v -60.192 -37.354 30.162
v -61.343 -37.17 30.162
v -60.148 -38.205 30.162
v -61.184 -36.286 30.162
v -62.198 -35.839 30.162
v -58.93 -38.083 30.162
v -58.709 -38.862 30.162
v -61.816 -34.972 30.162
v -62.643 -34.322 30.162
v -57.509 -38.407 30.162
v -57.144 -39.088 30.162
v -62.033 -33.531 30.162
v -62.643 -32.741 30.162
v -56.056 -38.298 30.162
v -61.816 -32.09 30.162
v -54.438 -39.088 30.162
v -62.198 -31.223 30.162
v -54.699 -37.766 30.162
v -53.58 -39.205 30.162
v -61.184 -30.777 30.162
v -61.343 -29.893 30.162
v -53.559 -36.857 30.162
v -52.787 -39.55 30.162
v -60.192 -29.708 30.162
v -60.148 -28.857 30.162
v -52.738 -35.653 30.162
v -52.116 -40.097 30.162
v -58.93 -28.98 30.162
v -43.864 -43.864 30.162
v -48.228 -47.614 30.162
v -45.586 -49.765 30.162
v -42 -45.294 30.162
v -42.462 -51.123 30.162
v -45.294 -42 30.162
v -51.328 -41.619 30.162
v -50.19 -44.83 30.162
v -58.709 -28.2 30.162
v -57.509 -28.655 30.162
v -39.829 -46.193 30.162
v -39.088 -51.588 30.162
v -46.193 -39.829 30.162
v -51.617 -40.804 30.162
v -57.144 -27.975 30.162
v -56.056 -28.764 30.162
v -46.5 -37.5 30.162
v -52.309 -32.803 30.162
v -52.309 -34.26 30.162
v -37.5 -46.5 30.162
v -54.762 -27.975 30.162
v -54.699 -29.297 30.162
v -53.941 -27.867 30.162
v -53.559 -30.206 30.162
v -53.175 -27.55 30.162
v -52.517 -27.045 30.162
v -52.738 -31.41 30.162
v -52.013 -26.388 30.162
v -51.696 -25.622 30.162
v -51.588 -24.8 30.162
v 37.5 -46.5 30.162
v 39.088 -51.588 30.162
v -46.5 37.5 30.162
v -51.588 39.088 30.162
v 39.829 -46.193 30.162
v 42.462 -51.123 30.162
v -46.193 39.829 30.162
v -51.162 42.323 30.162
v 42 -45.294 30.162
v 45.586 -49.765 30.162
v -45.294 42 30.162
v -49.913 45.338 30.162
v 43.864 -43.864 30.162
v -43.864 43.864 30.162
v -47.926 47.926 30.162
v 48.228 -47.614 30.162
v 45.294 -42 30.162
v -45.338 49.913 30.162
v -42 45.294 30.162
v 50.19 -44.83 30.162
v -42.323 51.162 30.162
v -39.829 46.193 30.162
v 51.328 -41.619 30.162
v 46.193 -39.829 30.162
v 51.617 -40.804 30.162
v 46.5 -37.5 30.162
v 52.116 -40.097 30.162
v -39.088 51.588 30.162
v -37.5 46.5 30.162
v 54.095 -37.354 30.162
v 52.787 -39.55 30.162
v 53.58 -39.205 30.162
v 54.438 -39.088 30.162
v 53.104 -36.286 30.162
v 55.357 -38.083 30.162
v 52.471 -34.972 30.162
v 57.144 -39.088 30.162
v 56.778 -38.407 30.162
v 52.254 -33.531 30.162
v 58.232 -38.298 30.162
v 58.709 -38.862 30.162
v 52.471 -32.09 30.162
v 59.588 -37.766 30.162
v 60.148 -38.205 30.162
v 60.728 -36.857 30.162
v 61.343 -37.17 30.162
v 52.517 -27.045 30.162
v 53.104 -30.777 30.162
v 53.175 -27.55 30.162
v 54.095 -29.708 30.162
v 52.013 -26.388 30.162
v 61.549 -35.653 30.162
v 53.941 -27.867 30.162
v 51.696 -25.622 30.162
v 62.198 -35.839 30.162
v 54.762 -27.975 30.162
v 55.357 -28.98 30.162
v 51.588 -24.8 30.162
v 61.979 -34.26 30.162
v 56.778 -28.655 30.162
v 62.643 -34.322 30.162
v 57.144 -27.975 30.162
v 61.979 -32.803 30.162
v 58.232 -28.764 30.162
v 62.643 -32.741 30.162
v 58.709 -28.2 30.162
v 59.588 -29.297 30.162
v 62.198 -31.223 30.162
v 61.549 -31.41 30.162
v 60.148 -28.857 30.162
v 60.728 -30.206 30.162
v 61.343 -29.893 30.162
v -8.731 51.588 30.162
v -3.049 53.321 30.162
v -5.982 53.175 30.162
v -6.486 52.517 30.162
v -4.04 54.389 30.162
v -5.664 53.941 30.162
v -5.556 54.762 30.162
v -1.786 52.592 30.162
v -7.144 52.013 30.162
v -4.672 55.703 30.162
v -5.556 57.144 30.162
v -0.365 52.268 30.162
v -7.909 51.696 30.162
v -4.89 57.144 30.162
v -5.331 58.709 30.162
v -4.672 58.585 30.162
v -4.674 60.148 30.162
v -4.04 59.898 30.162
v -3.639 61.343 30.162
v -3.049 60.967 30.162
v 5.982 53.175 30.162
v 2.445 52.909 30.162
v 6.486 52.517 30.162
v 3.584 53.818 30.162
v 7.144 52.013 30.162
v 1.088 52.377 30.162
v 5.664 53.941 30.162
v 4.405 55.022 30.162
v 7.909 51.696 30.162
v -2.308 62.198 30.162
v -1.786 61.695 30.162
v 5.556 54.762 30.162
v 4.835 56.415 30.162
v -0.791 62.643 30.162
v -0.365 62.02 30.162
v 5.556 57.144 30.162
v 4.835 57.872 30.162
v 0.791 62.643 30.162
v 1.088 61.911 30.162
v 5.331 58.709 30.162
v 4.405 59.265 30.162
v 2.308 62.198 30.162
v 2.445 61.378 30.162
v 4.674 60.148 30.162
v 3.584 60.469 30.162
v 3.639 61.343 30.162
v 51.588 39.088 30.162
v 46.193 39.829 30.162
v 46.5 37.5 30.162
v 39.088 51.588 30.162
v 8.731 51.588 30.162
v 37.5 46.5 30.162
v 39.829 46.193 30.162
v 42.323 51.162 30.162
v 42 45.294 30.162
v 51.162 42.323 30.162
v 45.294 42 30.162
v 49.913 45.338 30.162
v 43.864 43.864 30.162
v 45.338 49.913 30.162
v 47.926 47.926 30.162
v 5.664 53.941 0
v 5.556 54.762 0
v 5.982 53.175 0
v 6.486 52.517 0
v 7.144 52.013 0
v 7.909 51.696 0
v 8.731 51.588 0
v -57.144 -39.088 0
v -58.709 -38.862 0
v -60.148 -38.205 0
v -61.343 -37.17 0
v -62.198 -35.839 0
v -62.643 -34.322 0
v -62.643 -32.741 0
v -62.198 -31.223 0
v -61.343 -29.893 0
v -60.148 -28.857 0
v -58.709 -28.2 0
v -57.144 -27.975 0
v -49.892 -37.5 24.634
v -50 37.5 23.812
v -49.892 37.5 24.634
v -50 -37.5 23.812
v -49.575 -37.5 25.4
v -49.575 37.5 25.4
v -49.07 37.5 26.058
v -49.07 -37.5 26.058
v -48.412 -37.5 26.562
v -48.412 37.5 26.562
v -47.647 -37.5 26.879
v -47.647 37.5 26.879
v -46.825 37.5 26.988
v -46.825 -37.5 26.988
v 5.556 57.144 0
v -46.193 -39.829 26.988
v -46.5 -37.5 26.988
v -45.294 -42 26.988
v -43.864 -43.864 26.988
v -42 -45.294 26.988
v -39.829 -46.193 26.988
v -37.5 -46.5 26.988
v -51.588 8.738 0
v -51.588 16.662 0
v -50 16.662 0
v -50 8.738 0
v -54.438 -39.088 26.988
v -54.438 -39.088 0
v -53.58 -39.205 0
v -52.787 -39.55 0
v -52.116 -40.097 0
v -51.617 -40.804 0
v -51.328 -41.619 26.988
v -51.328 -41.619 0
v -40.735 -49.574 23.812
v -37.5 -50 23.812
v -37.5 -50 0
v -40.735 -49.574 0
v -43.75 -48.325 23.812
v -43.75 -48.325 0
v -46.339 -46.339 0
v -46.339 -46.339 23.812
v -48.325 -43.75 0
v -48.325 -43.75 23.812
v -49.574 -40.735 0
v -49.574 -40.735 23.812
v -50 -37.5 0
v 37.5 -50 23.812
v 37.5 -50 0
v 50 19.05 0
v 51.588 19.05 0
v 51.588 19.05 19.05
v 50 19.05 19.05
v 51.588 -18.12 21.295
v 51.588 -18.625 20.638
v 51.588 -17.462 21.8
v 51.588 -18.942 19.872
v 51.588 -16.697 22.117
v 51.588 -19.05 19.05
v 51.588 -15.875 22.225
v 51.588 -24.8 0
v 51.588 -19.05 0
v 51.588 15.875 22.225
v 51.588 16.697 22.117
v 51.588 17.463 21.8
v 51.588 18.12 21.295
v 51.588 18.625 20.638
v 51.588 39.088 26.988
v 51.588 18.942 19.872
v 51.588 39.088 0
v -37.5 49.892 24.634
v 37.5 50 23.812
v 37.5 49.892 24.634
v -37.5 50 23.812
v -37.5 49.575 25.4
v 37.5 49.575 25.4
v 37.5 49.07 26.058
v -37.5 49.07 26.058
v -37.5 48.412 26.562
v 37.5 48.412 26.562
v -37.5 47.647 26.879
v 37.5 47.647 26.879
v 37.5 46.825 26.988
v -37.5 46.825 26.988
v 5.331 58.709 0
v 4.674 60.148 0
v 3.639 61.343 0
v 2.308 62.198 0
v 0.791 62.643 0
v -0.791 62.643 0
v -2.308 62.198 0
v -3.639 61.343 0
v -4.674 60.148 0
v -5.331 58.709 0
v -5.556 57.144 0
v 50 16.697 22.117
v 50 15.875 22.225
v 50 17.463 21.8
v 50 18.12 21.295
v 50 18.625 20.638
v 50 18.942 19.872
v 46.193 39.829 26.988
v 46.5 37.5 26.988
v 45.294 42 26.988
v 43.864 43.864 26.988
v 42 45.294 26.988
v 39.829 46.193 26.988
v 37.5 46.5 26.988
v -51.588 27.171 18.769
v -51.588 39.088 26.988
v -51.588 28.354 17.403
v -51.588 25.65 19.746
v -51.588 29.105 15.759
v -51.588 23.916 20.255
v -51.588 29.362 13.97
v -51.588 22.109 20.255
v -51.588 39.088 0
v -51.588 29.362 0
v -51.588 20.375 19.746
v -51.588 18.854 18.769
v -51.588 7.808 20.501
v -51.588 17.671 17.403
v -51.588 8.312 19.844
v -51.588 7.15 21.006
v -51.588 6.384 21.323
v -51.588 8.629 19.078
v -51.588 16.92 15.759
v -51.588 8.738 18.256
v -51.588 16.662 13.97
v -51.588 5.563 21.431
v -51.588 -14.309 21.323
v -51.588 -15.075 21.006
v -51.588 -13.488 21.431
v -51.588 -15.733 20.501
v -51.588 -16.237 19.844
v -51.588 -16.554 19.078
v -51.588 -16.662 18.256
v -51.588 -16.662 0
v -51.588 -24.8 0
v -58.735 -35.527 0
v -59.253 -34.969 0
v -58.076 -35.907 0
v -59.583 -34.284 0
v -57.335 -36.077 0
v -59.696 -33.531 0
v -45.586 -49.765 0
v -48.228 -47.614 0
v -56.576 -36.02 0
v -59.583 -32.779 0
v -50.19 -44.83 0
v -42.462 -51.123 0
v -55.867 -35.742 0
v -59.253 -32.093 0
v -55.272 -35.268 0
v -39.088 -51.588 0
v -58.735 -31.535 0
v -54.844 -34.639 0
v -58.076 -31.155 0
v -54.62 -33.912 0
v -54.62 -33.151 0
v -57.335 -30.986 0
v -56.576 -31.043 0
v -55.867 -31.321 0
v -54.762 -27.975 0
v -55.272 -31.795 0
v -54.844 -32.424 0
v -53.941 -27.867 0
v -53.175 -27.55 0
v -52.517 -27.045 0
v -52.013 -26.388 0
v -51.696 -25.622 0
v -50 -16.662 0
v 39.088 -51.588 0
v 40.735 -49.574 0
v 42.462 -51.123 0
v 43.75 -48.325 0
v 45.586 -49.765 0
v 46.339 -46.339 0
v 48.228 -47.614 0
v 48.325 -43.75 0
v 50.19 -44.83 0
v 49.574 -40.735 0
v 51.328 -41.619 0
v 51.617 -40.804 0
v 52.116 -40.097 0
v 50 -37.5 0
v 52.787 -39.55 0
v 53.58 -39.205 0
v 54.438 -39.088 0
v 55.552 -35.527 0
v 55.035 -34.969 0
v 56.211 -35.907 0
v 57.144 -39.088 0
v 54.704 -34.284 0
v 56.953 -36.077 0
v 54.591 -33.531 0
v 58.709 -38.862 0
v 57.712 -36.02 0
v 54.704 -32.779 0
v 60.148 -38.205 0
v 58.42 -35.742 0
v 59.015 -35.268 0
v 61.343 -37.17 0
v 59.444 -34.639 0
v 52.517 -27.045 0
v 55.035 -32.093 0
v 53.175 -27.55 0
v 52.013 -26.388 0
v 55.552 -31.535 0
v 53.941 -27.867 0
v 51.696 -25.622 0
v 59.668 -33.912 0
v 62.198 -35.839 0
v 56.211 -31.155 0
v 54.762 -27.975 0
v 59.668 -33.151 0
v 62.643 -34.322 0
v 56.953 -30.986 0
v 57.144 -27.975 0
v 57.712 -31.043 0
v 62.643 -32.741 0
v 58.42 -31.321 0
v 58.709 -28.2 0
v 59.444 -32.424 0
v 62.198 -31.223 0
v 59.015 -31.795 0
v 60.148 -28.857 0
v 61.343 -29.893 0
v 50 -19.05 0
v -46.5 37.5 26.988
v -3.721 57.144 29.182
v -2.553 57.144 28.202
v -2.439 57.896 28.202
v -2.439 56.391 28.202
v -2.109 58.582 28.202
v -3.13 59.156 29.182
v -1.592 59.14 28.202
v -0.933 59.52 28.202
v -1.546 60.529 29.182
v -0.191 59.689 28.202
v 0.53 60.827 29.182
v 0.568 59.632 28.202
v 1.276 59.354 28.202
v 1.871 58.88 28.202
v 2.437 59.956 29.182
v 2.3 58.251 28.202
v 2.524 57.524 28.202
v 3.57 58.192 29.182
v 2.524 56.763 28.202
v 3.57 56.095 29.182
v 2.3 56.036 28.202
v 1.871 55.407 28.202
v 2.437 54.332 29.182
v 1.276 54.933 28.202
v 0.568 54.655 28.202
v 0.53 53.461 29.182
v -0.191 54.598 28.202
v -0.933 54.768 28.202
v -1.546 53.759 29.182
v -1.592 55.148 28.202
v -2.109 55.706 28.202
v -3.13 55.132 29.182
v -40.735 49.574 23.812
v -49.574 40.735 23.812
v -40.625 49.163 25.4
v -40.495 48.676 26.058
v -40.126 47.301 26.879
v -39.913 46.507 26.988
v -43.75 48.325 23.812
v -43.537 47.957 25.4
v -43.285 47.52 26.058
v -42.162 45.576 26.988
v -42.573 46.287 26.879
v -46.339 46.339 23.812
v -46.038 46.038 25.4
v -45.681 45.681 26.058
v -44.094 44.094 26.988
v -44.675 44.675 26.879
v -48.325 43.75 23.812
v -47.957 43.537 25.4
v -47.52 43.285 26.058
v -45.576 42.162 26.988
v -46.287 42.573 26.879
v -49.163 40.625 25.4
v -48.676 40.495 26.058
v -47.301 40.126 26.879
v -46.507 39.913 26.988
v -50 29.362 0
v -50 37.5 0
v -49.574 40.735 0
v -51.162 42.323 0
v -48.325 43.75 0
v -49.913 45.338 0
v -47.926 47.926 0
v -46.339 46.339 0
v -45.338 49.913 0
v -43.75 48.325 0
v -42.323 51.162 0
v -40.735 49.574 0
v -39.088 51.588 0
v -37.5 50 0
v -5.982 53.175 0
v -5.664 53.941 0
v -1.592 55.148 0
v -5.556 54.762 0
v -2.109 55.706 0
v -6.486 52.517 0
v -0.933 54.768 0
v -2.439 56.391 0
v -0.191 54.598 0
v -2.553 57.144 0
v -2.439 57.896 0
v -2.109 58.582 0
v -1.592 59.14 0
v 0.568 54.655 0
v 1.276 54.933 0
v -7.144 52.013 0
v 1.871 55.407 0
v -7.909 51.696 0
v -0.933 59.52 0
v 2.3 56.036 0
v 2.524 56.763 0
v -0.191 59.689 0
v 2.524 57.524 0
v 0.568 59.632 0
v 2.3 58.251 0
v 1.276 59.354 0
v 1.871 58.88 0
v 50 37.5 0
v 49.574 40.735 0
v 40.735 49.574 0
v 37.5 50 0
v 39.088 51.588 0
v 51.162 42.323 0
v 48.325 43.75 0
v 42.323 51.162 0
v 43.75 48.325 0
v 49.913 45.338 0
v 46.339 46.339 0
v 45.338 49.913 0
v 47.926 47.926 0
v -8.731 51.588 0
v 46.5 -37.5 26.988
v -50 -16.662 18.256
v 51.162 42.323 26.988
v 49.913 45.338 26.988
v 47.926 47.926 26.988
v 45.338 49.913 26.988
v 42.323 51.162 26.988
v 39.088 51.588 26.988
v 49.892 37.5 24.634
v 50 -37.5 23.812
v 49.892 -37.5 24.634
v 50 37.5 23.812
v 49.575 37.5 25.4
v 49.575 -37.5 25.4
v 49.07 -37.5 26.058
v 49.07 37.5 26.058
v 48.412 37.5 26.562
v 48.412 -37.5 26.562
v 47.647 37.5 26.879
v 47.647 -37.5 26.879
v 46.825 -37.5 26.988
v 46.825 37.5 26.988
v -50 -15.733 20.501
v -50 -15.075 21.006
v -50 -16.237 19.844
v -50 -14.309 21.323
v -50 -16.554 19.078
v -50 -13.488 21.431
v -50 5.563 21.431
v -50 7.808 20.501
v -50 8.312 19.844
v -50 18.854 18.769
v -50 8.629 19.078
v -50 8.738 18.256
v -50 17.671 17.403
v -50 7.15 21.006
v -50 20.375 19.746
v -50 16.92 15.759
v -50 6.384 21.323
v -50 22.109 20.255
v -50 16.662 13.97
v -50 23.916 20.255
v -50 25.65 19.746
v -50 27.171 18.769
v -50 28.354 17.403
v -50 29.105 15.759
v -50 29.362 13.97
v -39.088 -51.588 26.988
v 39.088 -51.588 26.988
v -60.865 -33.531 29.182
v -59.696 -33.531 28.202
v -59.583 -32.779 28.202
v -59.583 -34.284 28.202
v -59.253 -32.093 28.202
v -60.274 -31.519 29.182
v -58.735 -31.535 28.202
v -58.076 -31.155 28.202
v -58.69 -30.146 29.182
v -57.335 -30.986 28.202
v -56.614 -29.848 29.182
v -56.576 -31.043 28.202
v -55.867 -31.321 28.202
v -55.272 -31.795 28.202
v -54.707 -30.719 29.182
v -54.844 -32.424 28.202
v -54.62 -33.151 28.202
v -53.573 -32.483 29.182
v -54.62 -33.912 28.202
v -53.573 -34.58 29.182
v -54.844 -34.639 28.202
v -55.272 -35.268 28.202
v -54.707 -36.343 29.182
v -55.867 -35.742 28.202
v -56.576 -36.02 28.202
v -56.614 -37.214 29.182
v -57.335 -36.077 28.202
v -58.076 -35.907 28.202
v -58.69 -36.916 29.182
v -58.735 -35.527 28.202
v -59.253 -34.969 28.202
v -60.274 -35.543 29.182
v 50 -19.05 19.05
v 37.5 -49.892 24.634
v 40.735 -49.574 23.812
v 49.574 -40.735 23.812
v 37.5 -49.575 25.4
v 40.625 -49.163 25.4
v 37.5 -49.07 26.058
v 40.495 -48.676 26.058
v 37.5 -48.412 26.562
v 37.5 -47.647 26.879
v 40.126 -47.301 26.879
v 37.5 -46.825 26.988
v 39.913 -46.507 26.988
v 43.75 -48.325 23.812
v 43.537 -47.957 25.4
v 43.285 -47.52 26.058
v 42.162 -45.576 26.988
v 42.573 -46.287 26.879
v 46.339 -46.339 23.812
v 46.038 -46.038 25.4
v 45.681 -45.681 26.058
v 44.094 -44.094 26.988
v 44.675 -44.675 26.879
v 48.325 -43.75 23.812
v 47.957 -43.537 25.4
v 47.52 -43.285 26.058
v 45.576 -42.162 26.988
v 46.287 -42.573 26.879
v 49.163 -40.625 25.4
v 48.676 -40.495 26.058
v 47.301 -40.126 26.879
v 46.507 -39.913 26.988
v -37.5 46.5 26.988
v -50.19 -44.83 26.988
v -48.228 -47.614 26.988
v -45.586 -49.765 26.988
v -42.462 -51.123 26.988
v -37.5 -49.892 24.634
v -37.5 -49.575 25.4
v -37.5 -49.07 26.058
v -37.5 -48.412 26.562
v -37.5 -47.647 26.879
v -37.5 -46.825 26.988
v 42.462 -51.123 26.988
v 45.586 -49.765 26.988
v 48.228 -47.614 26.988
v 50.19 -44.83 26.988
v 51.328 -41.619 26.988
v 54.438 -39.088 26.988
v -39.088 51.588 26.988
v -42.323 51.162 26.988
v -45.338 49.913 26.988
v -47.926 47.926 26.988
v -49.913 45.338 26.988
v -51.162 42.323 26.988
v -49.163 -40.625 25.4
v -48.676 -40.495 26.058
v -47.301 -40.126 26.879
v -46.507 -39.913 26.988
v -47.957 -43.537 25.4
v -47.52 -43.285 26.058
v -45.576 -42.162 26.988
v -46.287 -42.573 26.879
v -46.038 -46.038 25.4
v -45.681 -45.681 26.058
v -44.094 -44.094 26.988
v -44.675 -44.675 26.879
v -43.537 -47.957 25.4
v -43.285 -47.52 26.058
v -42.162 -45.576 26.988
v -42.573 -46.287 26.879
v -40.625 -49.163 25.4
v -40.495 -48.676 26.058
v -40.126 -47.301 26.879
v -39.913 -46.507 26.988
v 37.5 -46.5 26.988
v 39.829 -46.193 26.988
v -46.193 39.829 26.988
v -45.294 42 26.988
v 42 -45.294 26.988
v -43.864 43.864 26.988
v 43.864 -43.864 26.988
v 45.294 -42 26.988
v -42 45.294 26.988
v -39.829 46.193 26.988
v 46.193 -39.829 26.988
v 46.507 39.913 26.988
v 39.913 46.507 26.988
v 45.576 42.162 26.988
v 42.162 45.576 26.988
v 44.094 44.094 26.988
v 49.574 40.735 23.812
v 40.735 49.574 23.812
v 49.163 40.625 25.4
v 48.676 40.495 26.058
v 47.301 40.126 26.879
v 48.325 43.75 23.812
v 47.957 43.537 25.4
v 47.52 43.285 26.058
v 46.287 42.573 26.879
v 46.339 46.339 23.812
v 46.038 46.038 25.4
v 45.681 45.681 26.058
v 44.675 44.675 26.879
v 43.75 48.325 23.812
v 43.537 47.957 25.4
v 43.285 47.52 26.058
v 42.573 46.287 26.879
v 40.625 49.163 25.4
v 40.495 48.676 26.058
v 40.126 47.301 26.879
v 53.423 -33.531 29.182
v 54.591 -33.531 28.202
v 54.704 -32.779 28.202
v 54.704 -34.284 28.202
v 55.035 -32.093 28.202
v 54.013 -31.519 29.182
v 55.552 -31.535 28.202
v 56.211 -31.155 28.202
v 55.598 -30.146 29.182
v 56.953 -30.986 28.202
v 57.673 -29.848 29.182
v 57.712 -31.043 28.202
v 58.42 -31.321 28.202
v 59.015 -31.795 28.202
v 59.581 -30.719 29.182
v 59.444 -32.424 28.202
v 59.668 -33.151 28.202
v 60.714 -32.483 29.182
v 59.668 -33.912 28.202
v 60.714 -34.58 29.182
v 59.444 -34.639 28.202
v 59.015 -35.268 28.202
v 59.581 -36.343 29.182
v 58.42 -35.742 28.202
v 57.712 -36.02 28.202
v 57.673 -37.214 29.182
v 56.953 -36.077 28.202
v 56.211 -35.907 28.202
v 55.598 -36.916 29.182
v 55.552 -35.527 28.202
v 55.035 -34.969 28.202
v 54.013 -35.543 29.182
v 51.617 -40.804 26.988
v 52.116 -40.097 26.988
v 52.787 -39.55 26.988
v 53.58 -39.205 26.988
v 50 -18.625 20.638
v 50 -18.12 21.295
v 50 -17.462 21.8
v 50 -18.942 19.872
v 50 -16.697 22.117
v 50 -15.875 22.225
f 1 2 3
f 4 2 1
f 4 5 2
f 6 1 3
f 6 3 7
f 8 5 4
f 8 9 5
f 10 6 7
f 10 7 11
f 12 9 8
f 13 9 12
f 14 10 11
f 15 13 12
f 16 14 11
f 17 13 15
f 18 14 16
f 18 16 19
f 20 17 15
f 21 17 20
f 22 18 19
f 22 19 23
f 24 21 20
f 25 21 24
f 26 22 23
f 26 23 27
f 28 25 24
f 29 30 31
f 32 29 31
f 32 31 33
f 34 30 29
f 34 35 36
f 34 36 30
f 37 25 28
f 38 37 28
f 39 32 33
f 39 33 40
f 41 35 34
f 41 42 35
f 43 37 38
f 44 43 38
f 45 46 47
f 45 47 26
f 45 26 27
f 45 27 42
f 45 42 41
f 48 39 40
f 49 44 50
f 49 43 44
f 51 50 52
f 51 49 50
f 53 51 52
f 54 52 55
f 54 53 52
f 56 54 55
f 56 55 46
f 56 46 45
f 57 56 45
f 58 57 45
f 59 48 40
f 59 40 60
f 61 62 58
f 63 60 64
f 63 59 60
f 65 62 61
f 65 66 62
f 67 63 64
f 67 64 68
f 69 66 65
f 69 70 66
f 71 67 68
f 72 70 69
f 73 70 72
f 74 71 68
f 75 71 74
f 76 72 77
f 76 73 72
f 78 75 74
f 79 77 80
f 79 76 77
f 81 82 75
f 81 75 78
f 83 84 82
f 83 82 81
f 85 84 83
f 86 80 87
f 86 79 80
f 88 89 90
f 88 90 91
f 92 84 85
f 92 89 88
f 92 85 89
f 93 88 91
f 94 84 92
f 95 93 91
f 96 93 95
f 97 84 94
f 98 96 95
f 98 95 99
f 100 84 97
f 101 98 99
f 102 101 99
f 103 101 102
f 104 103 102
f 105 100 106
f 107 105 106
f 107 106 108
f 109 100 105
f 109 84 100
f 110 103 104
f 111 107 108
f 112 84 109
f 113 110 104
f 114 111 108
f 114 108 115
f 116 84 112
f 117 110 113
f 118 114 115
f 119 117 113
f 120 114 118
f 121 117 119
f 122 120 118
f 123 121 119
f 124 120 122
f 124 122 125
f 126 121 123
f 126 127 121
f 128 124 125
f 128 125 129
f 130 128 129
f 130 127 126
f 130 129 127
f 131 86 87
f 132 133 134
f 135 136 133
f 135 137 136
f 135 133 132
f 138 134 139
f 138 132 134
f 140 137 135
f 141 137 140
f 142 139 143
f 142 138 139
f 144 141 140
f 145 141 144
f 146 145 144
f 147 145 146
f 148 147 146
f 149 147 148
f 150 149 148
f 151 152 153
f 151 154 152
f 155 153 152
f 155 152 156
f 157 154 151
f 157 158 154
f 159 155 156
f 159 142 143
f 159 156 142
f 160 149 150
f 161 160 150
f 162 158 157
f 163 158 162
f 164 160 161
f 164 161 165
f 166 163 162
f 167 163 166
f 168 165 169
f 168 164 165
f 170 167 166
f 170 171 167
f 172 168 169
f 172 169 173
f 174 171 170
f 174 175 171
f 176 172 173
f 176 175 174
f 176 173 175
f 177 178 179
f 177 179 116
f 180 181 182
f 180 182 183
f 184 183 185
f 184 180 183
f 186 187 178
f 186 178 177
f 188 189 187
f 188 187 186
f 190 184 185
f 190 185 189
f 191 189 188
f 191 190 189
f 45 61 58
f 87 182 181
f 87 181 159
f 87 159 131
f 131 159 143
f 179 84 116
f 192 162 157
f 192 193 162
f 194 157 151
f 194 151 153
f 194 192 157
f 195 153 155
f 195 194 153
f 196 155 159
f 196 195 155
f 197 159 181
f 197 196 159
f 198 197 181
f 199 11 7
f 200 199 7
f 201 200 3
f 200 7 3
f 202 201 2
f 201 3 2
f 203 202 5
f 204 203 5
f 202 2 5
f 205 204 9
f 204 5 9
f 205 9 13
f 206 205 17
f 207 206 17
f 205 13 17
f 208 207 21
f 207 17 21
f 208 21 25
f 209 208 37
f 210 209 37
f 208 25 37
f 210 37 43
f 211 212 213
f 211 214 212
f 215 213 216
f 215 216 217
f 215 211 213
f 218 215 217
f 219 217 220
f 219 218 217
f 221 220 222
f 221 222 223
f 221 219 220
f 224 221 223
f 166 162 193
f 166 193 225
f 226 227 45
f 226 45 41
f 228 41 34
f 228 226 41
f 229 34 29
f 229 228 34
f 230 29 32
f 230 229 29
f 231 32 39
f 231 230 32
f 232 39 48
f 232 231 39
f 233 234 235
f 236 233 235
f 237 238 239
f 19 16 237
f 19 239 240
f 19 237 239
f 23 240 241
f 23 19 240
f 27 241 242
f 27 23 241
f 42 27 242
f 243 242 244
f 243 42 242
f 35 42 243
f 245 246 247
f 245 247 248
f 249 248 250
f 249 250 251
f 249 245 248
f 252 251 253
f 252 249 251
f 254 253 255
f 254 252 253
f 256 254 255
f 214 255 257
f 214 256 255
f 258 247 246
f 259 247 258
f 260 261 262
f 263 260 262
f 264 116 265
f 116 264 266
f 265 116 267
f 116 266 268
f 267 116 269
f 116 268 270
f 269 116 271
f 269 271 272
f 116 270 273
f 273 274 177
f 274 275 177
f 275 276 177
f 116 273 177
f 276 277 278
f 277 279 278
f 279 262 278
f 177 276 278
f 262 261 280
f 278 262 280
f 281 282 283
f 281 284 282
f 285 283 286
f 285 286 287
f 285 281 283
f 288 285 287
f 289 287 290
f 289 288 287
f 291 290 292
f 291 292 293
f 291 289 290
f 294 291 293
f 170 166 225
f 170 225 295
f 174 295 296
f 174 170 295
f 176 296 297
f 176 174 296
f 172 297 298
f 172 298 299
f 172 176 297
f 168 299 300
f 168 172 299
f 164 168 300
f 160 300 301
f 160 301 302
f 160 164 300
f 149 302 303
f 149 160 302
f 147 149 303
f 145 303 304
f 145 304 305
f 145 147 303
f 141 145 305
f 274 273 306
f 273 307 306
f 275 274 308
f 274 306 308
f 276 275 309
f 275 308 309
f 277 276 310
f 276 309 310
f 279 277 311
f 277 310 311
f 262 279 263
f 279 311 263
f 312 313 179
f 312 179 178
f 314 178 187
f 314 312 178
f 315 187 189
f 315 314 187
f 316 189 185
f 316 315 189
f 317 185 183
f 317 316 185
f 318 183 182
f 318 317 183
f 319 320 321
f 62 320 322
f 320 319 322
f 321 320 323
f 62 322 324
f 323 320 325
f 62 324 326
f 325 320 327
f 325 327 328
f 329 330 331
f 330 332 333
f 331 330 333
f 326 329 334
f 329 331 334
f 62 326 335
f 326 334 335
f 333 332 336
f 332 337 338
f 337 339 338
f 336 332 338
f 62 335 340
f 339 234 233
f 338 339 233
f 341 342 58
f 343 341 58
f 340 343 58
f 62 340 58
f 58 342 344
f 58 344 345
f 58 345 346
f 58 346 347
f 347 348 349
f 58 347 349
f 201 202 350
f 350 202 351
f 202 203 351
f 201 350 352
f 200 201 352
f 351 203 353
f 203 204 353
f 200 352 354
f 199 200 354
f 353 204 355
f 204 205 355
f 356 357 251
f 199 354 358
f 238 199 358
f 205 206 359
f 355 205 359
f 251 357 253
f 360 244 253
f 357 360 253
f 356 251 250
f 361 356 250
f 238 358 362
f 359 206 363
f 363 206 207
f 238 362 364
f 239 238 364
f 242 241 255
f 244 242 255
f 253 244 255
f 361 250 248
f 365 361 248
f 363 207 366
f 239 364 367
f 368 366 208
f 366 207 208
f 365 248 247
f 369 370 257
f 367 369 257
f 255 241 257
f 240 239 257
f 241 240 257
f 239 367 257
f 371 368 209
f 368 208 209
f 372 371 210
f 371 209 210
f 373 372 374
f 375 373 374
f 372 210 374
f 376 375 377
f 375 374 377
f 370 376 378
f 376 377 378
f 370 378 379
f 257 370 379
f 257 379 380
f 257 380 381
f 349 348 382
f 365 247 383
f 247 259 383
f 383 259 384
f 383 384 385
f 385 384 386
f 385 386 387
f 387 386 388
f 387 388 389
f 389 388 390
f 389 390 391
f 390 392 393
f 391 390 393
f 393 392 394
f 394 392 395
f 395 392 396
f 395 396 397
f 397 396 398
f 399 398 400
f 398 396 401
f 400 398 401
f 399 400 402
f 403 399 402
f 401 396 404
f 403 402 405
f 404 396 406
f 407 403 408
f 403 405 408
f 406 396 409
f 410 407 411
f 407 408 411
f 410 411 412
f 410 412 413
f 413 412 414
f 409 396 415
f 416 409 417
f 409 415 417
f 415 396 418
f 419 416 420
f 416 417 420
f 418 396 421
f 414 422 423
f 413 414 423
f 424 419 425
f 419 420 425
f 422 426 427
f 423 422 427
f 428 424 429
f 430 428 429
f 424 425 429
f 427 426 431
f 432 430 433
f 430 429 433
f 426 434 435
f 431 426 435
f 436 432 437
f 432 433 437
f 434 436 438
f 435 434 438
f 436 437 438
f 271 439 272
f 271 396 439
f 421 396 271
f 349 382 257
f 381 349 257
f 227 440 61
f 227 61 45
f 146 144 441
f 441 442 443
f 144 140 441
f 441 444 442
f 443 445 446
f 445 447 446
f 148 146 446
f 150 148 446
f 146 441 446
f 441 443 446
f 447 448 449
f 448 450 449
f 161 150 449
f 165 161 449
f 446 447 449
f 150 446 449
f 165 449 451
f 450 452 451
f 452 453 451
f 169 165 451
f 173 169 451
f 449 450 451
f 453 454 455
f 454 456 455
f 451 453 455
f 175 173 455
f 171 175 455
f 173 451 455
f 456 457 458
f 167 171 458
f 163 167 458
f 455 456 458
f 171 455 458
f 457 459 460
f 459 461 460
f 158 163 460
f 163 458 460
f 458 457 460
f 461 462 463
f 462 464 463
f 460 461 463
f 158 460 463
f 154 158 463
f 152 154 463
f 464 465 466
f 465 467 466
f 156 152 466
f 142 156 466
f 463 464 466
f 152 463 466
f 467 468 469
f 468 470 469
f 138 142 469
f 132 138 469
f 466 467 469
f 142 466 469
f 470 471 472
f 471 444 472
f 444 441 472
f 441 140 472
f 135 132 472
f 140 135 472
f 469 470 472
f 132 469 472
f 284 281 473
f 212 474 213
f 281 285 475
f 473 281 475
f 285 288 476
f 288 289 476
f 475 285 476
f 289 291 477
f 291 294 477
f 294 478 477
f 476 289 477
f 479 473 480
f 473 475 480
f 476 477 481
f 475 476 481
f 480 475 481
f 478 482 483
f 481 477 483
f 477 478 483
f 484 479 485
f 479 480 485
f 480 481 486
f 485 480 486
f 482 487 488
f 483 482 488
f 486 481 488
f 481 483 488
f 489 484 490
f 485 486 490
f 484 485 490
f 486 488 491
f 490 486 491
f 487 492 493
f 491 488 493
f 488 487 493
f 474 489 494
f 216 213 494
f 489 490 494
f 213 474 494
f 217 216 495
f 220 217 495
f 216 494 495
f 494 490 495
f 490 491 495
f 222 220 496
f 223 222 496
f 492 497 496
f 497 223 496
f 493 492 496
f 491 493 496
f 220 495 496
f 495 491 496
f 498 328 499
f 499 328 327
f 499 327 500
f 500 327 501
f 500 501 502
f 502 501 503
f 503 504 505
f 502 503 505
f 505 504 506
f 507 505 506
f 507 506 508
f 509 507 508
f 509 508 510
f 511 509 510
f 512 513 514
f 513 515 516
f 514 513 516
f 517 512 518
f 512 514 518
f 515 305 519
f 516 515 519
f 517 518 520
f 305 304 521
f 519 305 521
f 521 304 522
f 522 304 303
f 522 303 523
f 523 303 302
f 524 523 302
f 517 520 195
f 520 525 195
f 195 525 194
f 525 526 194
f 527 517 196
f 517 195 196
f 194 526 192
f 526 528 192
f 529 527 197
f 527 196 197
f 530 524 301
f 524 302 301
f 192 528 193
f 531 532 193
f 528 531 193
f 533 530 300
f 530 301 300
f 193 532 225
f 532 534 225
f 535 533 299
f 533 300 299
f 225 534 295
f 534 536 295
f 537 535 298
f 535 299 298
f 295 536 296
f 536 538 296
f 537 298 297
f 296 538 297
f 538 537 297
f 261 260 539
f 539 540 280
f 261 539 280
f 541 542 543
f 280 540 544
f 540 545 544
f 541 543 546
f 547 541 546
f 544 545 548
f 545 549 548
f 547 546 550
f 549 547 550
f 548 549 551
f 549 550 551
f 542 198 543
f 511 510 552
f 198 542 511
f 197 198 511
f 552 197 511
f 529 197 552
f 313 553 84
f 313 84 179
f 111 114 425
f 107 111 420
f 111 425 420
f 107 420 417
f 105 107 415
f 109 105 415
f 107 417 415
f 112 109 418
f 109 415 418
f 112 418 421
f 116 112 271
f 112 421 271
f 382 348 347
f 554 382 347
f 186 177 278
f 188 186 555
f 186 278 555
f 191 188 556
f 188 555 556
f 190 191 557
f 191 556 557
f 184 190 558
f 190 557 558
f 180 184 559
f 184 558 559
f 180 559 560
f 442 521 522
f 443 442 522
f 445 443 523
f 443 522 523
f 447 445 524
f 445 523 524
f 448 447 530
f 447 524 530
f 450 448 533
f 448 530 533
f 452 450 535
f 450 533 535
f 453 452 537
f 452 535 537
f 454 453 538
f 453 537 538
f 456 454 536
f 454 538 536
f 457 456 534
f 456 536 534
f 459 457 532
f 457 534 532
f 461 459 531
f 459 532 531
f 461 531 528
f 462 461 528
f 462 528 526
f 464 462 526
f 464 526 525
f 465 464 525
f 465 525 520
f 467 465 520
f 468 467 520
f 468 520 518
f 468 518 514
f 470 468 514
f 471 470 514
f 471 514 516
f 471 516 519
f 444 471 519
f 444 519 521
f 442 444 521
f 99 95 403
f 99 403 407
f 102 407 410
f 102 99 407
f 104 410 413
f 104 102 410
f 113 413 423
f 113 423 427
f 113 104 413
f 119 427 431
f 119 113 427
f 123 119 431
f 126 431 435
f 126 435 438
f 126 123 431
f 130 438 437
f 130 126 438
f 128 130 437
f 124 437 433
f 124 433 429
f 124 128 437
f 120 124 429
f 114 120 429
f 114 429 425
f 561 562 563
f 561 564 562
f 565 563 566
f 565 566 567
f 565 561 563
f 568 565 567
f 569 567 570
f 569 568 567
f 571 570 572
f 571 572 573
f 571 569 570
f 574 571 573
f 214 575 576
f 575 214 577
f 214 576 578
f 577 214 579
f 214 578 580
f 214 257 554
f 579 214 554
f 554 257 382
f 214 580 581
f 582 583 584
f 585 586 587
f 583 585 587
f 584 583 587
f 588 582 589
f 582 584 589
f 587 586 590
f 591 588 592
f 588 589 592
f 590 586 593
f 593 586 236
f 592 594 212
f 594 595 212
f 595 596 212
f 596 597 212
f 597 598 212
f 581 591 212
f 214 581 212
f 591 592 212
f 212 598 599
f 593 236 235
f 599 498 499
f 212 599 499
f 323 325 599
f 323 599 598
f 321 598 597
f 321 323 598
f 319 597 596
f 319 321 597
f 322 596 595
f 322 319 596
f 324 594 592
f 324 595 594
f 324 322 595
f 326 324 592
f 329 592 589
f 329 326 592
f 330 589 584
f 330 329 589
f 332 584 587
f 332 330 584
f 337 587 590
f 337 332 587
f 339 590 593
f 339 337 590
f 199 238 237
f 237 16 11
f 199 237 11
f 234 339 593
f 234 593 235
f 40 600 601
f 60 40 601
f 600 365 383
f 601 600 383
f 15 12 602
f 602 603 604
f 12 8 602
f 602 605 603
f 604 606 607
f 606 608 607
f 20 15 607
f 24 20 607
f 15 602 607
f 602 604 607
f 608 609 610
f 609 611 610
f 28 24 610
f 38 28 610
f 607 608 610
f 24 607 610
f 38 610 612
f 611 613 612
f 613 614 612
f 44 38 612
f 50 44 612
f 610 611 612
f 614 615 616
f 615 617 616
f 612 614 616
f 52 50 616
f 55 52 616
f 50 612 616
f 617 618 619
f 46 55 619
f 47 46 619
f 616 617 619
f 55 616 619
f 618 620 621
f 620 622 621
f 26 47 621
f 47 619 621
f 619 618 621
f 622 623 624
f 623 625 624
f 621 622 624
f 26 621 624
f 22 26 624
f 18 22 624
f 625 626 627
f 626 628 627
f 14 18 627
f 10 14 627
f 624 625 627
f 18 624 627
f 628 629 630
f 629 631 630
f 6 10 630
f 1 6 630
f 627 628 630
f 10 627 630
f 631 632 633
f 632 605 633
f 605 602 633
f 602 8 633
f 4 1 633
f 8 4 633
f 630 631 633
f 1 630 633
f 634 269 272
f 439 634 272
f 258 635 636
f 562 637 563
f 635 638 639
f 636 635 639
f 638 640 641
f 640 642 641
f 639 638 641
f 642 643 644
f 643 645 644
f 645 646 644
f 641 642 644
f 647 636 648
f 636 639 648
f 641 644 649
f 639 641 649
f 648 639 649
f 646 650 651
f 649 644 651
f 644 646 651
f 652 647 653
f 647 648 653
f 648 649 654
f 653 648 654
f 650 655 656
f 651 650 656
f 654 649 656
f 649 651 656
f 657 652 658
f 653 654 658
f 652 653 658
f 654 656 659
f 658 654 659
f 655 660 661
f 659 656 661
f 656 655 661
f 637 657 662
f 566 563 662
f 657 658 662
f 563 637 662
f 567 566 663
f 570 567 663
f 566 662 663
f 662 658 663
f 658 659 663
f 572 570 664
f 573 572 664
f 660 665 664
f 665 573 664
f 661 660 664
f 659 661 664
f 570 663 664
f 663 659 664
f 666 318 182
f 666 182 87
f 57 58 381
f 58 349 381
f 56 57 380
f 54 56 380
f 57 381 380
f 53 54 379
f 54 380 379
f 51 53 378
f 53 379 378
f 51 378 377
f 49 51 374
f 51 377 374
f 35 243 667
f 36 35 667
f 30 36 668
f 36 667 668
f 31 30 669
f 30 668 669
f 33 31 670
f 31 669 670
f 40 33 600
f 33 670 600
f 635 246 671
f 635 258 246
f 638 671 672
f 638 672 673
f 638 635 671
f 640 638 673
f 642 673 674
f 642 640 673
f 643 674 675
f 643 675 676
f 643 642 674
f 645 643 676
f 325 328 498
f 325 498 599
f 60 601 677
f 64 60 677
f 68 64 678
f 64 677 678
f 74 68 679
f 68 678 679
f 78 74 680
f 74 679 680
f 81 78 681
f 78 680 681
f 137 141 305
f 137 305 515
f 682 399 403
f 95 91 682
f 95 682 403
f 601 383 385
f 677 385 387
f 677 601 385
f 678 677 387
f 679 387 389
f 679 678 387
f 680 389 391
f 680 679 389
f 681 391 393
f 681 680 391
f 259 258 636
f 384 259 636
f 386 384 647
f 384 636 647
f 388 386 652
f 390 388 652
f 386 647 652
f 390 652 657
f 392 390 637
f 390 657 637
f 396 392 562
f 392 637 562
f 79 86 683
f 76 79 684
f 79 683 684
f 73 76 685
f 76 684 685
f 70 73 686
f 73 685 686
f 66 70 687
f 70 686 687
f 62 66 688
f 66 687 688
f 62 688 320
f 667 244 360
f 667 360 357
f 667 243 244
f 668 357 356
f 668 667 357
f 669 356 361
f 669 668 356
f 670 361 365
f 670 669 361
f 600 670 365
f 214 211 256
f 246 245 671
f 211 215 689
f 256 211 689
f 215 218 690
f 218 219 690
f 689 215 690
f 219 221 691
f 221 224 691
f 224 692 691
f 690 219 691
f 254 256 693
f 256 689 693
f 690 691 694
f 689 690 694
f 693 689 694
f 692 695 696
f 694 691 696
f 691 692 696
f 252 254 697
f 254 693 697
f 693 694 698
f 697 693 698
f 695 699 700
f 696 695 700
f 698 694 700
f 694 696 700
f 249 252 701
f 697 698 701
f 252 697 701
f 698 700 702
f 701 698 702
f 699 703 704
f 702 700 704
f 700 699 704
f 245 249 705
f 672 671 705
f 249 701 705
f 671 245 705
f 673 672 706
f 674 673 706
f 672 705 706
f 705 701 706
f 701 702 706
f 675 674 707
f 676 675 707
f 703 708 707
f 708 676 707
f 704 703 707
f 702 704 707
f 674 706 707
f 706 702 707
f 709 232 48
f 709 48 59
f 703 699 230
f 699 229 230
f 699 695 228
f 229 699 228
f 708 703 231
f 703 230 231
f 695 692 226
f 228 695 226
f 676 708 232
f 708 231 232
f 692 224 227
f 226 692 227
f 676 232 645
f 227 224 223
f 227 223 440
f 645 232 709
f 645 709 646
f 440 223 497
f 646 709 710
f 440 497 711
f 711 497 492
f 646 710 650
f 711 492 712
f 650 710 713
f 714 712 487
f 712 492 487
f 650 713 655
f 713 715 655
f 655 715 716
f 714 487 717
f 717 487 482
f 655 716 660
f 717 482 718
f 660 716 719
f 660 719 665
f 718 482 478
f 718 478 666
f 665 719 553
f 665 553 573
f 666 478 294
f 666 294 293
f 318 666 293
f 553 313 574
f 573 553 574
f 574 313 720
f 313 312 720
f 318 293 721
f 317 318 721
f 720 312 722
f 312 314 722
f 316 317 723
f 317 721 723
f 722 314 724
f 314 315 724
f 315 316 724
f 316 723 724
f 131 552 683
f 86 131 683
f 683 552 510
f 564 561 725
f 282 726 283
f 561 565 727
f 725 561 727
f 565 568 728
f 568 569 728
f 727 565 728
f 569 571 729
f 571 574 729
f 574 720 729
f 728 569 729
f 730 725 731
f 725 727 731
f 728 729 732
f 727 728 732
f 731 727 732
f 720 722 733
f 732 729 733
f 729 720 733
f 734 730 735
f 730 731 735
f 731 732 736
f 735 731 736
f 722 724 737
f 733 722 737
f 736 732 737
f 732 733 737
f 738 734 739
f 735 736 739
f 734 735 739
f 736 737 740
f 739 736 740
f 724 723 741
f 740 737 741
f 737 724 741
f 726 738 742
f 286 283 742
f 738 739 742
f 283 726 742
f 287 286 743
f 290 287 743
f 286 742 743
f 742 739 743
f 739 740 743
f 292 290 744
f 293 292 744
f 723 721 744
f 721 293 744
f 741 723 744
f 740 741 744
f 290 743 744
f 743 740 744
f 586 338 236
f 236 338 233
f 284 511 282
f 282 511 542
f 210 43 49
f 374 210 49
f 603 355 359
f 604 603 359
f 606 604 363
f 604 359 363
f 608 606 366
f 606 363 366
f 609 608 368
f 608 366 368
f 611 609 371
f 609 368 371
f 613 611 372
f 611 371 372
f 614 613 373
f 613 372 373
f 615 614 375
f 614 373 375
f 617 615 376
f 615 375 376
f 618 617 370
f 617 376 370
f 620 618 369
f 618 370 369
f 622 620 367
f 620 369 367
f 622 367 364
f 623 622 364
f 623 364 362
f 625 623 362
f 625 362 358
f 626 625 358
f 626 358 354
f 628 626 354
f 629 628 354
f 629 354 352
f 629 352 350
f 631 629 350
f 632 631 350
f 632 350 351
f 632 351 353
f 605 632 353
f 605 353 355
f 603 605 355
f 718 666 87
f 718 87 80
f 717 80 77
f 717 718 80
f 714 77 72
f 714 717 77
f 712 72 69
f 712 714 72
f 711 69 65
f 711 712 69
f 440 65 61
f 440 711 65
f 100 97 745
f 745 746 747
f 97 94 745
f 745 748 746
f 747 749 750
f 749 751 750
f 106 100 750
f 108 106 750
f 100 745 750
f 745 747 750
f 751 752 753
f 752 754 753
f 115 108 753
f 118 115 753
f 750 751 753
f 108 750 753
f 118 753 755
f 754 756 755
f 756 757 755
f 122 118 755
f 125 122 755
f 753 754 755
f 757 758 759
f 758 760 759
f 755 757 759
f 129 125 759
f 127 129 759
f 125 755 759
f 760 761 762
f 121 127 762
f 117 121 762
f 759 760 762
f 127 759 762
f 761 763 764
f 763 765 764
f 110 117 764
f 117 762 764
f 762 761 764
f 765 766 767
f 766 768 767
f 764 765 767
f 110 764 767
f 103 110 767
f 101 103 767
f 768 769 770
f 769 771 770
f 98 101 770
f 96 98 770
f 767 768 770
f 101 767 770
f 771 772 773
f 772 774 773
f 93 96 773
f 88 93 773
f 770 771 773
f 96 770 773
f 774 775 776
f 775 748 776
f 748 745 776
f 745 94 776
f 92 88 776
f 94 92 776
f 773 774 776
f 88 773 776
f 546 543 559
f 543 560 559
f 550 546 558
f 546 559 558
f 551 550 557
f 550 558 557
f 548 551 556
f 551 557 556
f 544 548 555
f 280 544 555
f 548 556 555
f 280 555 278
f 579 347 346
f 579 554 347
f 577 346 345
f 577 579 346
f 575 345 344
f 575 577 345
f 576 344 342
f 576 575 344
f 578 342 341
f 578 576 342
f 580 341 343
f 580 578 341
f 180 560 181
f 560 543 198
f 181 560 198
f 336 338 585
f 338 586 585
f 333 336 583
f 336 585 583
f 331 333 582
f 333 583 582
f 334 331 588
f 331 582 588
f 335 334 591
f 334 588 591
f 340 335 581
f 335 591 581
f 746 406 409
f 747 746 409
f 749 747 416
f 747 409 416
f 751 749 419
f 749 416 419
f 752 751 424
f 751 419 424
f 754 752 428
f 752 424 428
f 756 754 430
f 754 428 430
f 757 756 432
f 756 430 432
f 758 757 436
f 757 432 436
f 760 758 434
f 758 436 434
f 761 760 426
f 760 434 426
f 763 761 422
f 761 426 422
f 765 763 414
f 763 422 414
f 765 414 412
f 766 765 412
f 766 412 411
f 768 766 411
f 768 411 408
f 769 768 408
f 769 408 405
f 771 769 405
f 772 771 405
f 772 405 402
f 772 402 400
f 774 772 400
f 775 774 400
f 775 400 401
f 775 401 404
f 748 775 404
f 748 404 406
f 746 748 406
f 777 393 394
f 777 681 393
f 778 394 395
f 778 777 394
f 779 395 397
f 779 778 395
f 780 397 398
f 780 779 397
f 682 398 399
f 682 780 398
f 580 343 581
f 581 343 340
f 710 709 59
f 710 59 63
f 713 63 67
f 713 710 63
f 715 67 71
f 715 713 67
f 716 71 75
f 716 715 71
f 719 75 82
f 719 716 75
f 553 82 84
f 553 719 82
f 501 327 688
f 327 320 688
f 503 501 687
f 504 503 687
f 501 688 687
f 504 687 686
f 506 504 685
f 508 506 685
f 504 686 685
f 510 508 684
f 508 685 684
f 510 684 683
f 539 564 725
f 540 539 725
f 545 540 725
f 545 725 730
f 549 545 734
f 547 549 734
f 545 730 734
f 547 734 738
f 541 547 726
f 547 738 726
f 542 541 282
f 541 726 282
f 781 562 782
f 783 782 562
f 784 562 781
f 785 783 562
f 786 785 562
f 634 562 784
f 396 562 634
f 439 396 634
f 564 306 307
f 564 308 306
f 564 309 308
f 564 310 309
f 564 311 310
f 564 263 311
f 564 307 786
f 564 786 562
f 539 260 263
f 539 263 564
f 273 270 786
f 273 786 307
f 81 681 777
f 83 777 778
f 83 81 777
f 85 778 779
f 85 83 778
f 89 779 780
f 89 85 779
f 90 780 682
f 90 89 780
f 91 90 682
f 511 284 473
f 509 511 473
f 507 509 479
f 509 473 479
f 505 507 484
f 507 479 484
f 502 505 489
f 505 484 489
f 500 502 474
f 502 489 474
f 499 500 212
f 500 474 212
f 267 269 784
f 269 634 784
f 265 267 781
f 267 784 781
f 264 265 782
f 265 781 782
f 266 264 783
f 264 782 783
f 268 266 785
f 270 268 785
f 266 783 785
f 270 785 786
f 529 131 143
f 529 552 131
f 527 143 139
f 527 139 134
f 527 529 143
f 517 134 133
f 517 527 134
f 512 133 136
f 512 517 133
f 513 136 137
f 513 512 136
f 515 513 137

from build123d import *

# Parameters (mm, degrees)
SKETCH1_W                                          = 103.175
SKETCH1_H                                          = 103.175
SKETCH1_W_2                                        = 100
SKETCH1_H_2                                        = 100
BOSS_EXTRUDE1_DEPTH                                = 26.9875
FILLET1_R                                          = 12.5
FILLET2_R                                          = 12.5
BOSS_EXTRUDE2_DEPTH                                = 3.175
CUT_EXTRUDE1_REACH                                 = 105.175
CUT_EXTRUDE2_REACH                                 = 105.175
CUT_EXTRUDE3_REACH                                 = 105.175
FILLET5_R                                          = 3.175
BOSS_EXTRUDE3_DEPTH                                = 30.1625
CSK_FOR_10_FLAT_HEAD_MACHINE_SCREW_100_D           = 5.1054
CSK_FOR_10_FLAT_HEAD_MACHINE_SCREW_100_DEPTH       = 30.1625
CSK_FOR_10_FLAT_HEAD_MACHINE_SCREW_100_CSINK_D     = 9.779
CSK_FOR_10_FLAT_HEAD_MACHINE_SCREW_100_CSINK_ANGLE = 100
FILLET4_R                                          = 3.175


with BuildPart() as part:
    # Sketch1 → Boss-Extrude1 (new body)
    with BuildSketch(Plane.XY):
        Rectangle(SKETCH1_W, SKETCH1_H)
        Rectangle(SKETCH1_W_2, SKETCH1_H_2, mode=Mode.SUBTRACT)
    extrude(amount=BOSS_EXTRUDE1_DEPTH)

    # Fillet1
    fillet1_edges = [part.edges().sort_by_distance(p)[0] for p in [
        (50, -50, 13.49375),
        (50, 50, 13.49375),
        (-50, 50, 13.49375),
        (-50, -50, 13.49375),
    ]]
    fillet(fillet1_edges, radius=FILLET1_R)

    # Fillet2
    fillet2_edges = [part.edges().sort_by_distance(p)[0] for p in [
        (51.5875, -51.5875, 13.49375),
        (-51.5875, -51.5875, 13.49375),
        (-51.5875, 51.5875, 13.49375),
        (51.5875, 51.5875, 13.49375),
    ]]
    fillet(fillet2_edges, radius=FILLET2_R)

    # Sketch2 → Boss-Extrude2 (add)
    with BuildSketch(Plane.XY.offset(26.9875)):
        with BuildLine():
            Line((-39.0875, -51.5875), (39.0875, -51.5875))
            ThreePointArc((39.0875, -51.5875), (47.926334765, -47.926334765), (51.5875, -39.0875))
            Line((51.5875, -39.0875), (51.5875, 39.0875))
            ThreePointArc((51.5875, 39.0875), (47.926334765, 47.926334765), (39.0875, 51.5875))
            Line((39.0875, 51.5875), (-39.0875, 51.5875))
            ThreePointArc((-39.0875, 51.5875), (-47.926334765, 47.926334765), (-51.5875, 39.0875))
            Line((-51.5875, 39.0875), (-51.5875, -39.0875))
            ThreePointArc((-51.5875, -39.0875), (-47.926334765, -47.926334765), (-39.0875, -51.5875))
        make_face()
        with BuildLine():
            Line((46.5, -37.5), (46.5, 37.5))
            ThreePointArc((46.5, 37.5), (43.863961031, 43.863961031), (37.5, 46.5))
            Line((37.5, 46.5), (-37.5, 46.5))
            ThreePointArc((-37.5, 46.5), (-43.863961031, 43.863961031), (-46.5, 37.5))
            Line((-46.5, 37.5), (-46.5, -37.5))
            ThreePointArc((-46.5, -37.5), (-43.863961031, -43.863961031), (-37.5, -46.5))
            Line((-37.5, -46.5), (37.5, -46.5))
            ThreePointArc((37.5, -46.5), (43.863961031, -43.863961031), (46.5, -37.5))
        make_face(mode=Mode.SUBTRACT)
    extrude(amount=BOSS_EXTRUDE2_DEPTH)

    # Sketch3 → Cut-Extrude1 (cut, up to next)
    with BuildSketch(Plane.ZY.offset(51.5875), mode=Mode.PRIVATE) as cut_extrude1_sk1:
        with BuildLine():
            Line((0, 29.3625), (13.97, 29.3625))
            ThreePointArc((13.97, 29.3625), (20.32, 23.0125), (13.97, 16.6625))
            Line((13.97, 16.6625), (0, 16.6625))
            ThreePointArc((0, 16.6625), (-6.35, 23.0125), (0, 29.3625))
        make_face()
    cut_extrude1_tool1 = extrude(cut_extrude1_sk1.sketch, amount=-CUT_EXTRUDE1_REACH, mode=Mode.PRIVATE) & part.part
    add(cut_extrude1_tool1.solids().sort_by_distance((-51.5875, 23.0125, 6.985))[0], mode=Mode.SUBTRACT)

    # Sketch5 → Cut-Extrude2 (cut, up to next)
    with BuildSketch(Plane.ZY.offset(51.5875), mode=Mode.PRIVATE) as cut_extrude2_sk1:
        Polygon((8.73125, -16.6625), (21.43125, -16.6625), (21.43125, 8.7375), (8.73125, 8.7375), (0, 8.7375), (0, -16.6625), align=None)
    cut_extrude2_tool1 = extrude(cut_extrude2_sk1.sketch, amount=-CUT_EXTRUDE2_REACH, mode=Mode.PRIVATE) & part.part
    add(cut_extrude2_tool1.solids().sort_by_distance((-51.5875, -3.9625, 10.715625))[0], mode=Mode.SUBTRACT)

    # Sketch6 → Cut-Extrude3 (cut, up to next)
    with BuildSketch(Plane(origin=(51.5875, 0, 0), x_dir=(0, 0, -1), z_dir=(1, 0, 0)), mode=Mode.PRIVATE) as cut_extrude3_sk1:
        Polygon((-3.175, -19.05), (-22.225, -19.05), (-22.225, 19.05), (-3.175, 19.05), (0, 19.05), (0, -19.05), align=None)
    cut_extrude3_tool1 = extrude(cut_extrude3_sk1.sketch, amount=-CUT_EXTRUDE3_REACH, mode=Mode.PRIVATE) & part.part
    add(cut_extrude3_tool1.solids().sort_by_distance((51.5875, 0, 11.1125))[0], mode=Mode.SUBTRACT)

    # Fillet5
    fillet5_edges = [part.edges().sort_by_distance(p)[0] for p in [
        (-50.79375, -16.6625, 21.43125),
        (-50.79375, 8.7375, 21.43125),
        (50.79375, 19.05, 22.225),
        (50.79375, -19.05, 22.225),
        (50, 0, 26.9875),
        (0, 50, 26.9875),
        (0, -50, 26.9875),
        (-50, 0, 26.9875),
        (46.338834765, 46.338834765, 26.9875),
        (46.338834765, -46.338834765, 26.9875),
        (-46.338834765, -46.338834765, 26.9875),
        (-46.338834765, 46.338834765, 26.9875),
    ]]
    fillet(fillet5_edges, radius=FILLET5_R)

    # Sketch7 → Boss-Extrude3 (add)
    with BuildSketch(Plane.XY.offset(30.1625)):
        with BuildLine():
            Line((57.14375, -27.975), (51.5875, -27.975))
            Line((51.5875, -27.975), (51.5875, -39.0875))
            Line((51.5875, -39.0875), (57.14375, -39.0875))
            ThreePointArc((57.14375, -39.0875), (62.7, -33.53125), (57.14375, -27.975))
        make_face()
        with BuildLine():
            Line((-51.5875, -39.0875), (-57.14375, -39.0875))
            ThreePointArc((-57.14375, -39.0875), (-62.7, -33.53125), (-57.14375, -27.975))
            Line((-57.14375, -27.975), (-51.5875, -27.975))
            Line((-51.5875, -27.975), (-51.5875, -39.0875))
        make_face()
        with BuildLine():
            Line((-5.55625, 51.5875), (5.55625, 51.5875))
            Line((5.55625, 51.5875), (5.55625, 57.14375))
            ThreePointArc((5.55625, 57.14375), (0, 62.7), (-5.55625, 57.14375))
            Line((-5.55625, 57.14375), (-5.55625, 51.5875))
        make_face()
    extrude(amount=-BOSS_EXTRUDE3_DEPTH)

    # CSK for #10 Flat Head Machine Screw (100)1
    with Locations(Plane(origin=(57.14375, -33.53125, 30.1625), x_dir=(1, 0, 0), z_dir=(0, 0, 1))):
        with Locations((0, 0), (-114.2875, 0), (-57.14375, 90.675)):
            CounterSinkHole(CSK_FOR_10_FLAT_HEAD_MACHINE_SCREW_100_D / 2, CSK_FOR_10_FLAT_HEAD_MACHINE_SCREW_100_CSINK_D / 2, depth=CSK_FOR_10_FLAT_HEAD_MACHINE_SCREW_100_DEPTH, counter_sink_angle=CSK_FOR_10_FLAT_HEAD_MACHINE_SCREW_100_CSINK_ANGLE)

    # Fillet4
    fillet4_edges = [part.edges().sort_by_distance(p)[0] for p in [
        (51.5875, -27.975, 15.08125),
        (-51.5875, -27.975, 15.08125),
        (5.55625, 51.5875, 15.08125),
        (-5.55625, 51.5875, 15.08125),
        (51.5875, -39.0875, 15.08125),
        (-51.5875, -39.0875, 15.08125),
    ]]
    fillet(fillet4_edges, radius=FILLET4_R)


solid = part.part
